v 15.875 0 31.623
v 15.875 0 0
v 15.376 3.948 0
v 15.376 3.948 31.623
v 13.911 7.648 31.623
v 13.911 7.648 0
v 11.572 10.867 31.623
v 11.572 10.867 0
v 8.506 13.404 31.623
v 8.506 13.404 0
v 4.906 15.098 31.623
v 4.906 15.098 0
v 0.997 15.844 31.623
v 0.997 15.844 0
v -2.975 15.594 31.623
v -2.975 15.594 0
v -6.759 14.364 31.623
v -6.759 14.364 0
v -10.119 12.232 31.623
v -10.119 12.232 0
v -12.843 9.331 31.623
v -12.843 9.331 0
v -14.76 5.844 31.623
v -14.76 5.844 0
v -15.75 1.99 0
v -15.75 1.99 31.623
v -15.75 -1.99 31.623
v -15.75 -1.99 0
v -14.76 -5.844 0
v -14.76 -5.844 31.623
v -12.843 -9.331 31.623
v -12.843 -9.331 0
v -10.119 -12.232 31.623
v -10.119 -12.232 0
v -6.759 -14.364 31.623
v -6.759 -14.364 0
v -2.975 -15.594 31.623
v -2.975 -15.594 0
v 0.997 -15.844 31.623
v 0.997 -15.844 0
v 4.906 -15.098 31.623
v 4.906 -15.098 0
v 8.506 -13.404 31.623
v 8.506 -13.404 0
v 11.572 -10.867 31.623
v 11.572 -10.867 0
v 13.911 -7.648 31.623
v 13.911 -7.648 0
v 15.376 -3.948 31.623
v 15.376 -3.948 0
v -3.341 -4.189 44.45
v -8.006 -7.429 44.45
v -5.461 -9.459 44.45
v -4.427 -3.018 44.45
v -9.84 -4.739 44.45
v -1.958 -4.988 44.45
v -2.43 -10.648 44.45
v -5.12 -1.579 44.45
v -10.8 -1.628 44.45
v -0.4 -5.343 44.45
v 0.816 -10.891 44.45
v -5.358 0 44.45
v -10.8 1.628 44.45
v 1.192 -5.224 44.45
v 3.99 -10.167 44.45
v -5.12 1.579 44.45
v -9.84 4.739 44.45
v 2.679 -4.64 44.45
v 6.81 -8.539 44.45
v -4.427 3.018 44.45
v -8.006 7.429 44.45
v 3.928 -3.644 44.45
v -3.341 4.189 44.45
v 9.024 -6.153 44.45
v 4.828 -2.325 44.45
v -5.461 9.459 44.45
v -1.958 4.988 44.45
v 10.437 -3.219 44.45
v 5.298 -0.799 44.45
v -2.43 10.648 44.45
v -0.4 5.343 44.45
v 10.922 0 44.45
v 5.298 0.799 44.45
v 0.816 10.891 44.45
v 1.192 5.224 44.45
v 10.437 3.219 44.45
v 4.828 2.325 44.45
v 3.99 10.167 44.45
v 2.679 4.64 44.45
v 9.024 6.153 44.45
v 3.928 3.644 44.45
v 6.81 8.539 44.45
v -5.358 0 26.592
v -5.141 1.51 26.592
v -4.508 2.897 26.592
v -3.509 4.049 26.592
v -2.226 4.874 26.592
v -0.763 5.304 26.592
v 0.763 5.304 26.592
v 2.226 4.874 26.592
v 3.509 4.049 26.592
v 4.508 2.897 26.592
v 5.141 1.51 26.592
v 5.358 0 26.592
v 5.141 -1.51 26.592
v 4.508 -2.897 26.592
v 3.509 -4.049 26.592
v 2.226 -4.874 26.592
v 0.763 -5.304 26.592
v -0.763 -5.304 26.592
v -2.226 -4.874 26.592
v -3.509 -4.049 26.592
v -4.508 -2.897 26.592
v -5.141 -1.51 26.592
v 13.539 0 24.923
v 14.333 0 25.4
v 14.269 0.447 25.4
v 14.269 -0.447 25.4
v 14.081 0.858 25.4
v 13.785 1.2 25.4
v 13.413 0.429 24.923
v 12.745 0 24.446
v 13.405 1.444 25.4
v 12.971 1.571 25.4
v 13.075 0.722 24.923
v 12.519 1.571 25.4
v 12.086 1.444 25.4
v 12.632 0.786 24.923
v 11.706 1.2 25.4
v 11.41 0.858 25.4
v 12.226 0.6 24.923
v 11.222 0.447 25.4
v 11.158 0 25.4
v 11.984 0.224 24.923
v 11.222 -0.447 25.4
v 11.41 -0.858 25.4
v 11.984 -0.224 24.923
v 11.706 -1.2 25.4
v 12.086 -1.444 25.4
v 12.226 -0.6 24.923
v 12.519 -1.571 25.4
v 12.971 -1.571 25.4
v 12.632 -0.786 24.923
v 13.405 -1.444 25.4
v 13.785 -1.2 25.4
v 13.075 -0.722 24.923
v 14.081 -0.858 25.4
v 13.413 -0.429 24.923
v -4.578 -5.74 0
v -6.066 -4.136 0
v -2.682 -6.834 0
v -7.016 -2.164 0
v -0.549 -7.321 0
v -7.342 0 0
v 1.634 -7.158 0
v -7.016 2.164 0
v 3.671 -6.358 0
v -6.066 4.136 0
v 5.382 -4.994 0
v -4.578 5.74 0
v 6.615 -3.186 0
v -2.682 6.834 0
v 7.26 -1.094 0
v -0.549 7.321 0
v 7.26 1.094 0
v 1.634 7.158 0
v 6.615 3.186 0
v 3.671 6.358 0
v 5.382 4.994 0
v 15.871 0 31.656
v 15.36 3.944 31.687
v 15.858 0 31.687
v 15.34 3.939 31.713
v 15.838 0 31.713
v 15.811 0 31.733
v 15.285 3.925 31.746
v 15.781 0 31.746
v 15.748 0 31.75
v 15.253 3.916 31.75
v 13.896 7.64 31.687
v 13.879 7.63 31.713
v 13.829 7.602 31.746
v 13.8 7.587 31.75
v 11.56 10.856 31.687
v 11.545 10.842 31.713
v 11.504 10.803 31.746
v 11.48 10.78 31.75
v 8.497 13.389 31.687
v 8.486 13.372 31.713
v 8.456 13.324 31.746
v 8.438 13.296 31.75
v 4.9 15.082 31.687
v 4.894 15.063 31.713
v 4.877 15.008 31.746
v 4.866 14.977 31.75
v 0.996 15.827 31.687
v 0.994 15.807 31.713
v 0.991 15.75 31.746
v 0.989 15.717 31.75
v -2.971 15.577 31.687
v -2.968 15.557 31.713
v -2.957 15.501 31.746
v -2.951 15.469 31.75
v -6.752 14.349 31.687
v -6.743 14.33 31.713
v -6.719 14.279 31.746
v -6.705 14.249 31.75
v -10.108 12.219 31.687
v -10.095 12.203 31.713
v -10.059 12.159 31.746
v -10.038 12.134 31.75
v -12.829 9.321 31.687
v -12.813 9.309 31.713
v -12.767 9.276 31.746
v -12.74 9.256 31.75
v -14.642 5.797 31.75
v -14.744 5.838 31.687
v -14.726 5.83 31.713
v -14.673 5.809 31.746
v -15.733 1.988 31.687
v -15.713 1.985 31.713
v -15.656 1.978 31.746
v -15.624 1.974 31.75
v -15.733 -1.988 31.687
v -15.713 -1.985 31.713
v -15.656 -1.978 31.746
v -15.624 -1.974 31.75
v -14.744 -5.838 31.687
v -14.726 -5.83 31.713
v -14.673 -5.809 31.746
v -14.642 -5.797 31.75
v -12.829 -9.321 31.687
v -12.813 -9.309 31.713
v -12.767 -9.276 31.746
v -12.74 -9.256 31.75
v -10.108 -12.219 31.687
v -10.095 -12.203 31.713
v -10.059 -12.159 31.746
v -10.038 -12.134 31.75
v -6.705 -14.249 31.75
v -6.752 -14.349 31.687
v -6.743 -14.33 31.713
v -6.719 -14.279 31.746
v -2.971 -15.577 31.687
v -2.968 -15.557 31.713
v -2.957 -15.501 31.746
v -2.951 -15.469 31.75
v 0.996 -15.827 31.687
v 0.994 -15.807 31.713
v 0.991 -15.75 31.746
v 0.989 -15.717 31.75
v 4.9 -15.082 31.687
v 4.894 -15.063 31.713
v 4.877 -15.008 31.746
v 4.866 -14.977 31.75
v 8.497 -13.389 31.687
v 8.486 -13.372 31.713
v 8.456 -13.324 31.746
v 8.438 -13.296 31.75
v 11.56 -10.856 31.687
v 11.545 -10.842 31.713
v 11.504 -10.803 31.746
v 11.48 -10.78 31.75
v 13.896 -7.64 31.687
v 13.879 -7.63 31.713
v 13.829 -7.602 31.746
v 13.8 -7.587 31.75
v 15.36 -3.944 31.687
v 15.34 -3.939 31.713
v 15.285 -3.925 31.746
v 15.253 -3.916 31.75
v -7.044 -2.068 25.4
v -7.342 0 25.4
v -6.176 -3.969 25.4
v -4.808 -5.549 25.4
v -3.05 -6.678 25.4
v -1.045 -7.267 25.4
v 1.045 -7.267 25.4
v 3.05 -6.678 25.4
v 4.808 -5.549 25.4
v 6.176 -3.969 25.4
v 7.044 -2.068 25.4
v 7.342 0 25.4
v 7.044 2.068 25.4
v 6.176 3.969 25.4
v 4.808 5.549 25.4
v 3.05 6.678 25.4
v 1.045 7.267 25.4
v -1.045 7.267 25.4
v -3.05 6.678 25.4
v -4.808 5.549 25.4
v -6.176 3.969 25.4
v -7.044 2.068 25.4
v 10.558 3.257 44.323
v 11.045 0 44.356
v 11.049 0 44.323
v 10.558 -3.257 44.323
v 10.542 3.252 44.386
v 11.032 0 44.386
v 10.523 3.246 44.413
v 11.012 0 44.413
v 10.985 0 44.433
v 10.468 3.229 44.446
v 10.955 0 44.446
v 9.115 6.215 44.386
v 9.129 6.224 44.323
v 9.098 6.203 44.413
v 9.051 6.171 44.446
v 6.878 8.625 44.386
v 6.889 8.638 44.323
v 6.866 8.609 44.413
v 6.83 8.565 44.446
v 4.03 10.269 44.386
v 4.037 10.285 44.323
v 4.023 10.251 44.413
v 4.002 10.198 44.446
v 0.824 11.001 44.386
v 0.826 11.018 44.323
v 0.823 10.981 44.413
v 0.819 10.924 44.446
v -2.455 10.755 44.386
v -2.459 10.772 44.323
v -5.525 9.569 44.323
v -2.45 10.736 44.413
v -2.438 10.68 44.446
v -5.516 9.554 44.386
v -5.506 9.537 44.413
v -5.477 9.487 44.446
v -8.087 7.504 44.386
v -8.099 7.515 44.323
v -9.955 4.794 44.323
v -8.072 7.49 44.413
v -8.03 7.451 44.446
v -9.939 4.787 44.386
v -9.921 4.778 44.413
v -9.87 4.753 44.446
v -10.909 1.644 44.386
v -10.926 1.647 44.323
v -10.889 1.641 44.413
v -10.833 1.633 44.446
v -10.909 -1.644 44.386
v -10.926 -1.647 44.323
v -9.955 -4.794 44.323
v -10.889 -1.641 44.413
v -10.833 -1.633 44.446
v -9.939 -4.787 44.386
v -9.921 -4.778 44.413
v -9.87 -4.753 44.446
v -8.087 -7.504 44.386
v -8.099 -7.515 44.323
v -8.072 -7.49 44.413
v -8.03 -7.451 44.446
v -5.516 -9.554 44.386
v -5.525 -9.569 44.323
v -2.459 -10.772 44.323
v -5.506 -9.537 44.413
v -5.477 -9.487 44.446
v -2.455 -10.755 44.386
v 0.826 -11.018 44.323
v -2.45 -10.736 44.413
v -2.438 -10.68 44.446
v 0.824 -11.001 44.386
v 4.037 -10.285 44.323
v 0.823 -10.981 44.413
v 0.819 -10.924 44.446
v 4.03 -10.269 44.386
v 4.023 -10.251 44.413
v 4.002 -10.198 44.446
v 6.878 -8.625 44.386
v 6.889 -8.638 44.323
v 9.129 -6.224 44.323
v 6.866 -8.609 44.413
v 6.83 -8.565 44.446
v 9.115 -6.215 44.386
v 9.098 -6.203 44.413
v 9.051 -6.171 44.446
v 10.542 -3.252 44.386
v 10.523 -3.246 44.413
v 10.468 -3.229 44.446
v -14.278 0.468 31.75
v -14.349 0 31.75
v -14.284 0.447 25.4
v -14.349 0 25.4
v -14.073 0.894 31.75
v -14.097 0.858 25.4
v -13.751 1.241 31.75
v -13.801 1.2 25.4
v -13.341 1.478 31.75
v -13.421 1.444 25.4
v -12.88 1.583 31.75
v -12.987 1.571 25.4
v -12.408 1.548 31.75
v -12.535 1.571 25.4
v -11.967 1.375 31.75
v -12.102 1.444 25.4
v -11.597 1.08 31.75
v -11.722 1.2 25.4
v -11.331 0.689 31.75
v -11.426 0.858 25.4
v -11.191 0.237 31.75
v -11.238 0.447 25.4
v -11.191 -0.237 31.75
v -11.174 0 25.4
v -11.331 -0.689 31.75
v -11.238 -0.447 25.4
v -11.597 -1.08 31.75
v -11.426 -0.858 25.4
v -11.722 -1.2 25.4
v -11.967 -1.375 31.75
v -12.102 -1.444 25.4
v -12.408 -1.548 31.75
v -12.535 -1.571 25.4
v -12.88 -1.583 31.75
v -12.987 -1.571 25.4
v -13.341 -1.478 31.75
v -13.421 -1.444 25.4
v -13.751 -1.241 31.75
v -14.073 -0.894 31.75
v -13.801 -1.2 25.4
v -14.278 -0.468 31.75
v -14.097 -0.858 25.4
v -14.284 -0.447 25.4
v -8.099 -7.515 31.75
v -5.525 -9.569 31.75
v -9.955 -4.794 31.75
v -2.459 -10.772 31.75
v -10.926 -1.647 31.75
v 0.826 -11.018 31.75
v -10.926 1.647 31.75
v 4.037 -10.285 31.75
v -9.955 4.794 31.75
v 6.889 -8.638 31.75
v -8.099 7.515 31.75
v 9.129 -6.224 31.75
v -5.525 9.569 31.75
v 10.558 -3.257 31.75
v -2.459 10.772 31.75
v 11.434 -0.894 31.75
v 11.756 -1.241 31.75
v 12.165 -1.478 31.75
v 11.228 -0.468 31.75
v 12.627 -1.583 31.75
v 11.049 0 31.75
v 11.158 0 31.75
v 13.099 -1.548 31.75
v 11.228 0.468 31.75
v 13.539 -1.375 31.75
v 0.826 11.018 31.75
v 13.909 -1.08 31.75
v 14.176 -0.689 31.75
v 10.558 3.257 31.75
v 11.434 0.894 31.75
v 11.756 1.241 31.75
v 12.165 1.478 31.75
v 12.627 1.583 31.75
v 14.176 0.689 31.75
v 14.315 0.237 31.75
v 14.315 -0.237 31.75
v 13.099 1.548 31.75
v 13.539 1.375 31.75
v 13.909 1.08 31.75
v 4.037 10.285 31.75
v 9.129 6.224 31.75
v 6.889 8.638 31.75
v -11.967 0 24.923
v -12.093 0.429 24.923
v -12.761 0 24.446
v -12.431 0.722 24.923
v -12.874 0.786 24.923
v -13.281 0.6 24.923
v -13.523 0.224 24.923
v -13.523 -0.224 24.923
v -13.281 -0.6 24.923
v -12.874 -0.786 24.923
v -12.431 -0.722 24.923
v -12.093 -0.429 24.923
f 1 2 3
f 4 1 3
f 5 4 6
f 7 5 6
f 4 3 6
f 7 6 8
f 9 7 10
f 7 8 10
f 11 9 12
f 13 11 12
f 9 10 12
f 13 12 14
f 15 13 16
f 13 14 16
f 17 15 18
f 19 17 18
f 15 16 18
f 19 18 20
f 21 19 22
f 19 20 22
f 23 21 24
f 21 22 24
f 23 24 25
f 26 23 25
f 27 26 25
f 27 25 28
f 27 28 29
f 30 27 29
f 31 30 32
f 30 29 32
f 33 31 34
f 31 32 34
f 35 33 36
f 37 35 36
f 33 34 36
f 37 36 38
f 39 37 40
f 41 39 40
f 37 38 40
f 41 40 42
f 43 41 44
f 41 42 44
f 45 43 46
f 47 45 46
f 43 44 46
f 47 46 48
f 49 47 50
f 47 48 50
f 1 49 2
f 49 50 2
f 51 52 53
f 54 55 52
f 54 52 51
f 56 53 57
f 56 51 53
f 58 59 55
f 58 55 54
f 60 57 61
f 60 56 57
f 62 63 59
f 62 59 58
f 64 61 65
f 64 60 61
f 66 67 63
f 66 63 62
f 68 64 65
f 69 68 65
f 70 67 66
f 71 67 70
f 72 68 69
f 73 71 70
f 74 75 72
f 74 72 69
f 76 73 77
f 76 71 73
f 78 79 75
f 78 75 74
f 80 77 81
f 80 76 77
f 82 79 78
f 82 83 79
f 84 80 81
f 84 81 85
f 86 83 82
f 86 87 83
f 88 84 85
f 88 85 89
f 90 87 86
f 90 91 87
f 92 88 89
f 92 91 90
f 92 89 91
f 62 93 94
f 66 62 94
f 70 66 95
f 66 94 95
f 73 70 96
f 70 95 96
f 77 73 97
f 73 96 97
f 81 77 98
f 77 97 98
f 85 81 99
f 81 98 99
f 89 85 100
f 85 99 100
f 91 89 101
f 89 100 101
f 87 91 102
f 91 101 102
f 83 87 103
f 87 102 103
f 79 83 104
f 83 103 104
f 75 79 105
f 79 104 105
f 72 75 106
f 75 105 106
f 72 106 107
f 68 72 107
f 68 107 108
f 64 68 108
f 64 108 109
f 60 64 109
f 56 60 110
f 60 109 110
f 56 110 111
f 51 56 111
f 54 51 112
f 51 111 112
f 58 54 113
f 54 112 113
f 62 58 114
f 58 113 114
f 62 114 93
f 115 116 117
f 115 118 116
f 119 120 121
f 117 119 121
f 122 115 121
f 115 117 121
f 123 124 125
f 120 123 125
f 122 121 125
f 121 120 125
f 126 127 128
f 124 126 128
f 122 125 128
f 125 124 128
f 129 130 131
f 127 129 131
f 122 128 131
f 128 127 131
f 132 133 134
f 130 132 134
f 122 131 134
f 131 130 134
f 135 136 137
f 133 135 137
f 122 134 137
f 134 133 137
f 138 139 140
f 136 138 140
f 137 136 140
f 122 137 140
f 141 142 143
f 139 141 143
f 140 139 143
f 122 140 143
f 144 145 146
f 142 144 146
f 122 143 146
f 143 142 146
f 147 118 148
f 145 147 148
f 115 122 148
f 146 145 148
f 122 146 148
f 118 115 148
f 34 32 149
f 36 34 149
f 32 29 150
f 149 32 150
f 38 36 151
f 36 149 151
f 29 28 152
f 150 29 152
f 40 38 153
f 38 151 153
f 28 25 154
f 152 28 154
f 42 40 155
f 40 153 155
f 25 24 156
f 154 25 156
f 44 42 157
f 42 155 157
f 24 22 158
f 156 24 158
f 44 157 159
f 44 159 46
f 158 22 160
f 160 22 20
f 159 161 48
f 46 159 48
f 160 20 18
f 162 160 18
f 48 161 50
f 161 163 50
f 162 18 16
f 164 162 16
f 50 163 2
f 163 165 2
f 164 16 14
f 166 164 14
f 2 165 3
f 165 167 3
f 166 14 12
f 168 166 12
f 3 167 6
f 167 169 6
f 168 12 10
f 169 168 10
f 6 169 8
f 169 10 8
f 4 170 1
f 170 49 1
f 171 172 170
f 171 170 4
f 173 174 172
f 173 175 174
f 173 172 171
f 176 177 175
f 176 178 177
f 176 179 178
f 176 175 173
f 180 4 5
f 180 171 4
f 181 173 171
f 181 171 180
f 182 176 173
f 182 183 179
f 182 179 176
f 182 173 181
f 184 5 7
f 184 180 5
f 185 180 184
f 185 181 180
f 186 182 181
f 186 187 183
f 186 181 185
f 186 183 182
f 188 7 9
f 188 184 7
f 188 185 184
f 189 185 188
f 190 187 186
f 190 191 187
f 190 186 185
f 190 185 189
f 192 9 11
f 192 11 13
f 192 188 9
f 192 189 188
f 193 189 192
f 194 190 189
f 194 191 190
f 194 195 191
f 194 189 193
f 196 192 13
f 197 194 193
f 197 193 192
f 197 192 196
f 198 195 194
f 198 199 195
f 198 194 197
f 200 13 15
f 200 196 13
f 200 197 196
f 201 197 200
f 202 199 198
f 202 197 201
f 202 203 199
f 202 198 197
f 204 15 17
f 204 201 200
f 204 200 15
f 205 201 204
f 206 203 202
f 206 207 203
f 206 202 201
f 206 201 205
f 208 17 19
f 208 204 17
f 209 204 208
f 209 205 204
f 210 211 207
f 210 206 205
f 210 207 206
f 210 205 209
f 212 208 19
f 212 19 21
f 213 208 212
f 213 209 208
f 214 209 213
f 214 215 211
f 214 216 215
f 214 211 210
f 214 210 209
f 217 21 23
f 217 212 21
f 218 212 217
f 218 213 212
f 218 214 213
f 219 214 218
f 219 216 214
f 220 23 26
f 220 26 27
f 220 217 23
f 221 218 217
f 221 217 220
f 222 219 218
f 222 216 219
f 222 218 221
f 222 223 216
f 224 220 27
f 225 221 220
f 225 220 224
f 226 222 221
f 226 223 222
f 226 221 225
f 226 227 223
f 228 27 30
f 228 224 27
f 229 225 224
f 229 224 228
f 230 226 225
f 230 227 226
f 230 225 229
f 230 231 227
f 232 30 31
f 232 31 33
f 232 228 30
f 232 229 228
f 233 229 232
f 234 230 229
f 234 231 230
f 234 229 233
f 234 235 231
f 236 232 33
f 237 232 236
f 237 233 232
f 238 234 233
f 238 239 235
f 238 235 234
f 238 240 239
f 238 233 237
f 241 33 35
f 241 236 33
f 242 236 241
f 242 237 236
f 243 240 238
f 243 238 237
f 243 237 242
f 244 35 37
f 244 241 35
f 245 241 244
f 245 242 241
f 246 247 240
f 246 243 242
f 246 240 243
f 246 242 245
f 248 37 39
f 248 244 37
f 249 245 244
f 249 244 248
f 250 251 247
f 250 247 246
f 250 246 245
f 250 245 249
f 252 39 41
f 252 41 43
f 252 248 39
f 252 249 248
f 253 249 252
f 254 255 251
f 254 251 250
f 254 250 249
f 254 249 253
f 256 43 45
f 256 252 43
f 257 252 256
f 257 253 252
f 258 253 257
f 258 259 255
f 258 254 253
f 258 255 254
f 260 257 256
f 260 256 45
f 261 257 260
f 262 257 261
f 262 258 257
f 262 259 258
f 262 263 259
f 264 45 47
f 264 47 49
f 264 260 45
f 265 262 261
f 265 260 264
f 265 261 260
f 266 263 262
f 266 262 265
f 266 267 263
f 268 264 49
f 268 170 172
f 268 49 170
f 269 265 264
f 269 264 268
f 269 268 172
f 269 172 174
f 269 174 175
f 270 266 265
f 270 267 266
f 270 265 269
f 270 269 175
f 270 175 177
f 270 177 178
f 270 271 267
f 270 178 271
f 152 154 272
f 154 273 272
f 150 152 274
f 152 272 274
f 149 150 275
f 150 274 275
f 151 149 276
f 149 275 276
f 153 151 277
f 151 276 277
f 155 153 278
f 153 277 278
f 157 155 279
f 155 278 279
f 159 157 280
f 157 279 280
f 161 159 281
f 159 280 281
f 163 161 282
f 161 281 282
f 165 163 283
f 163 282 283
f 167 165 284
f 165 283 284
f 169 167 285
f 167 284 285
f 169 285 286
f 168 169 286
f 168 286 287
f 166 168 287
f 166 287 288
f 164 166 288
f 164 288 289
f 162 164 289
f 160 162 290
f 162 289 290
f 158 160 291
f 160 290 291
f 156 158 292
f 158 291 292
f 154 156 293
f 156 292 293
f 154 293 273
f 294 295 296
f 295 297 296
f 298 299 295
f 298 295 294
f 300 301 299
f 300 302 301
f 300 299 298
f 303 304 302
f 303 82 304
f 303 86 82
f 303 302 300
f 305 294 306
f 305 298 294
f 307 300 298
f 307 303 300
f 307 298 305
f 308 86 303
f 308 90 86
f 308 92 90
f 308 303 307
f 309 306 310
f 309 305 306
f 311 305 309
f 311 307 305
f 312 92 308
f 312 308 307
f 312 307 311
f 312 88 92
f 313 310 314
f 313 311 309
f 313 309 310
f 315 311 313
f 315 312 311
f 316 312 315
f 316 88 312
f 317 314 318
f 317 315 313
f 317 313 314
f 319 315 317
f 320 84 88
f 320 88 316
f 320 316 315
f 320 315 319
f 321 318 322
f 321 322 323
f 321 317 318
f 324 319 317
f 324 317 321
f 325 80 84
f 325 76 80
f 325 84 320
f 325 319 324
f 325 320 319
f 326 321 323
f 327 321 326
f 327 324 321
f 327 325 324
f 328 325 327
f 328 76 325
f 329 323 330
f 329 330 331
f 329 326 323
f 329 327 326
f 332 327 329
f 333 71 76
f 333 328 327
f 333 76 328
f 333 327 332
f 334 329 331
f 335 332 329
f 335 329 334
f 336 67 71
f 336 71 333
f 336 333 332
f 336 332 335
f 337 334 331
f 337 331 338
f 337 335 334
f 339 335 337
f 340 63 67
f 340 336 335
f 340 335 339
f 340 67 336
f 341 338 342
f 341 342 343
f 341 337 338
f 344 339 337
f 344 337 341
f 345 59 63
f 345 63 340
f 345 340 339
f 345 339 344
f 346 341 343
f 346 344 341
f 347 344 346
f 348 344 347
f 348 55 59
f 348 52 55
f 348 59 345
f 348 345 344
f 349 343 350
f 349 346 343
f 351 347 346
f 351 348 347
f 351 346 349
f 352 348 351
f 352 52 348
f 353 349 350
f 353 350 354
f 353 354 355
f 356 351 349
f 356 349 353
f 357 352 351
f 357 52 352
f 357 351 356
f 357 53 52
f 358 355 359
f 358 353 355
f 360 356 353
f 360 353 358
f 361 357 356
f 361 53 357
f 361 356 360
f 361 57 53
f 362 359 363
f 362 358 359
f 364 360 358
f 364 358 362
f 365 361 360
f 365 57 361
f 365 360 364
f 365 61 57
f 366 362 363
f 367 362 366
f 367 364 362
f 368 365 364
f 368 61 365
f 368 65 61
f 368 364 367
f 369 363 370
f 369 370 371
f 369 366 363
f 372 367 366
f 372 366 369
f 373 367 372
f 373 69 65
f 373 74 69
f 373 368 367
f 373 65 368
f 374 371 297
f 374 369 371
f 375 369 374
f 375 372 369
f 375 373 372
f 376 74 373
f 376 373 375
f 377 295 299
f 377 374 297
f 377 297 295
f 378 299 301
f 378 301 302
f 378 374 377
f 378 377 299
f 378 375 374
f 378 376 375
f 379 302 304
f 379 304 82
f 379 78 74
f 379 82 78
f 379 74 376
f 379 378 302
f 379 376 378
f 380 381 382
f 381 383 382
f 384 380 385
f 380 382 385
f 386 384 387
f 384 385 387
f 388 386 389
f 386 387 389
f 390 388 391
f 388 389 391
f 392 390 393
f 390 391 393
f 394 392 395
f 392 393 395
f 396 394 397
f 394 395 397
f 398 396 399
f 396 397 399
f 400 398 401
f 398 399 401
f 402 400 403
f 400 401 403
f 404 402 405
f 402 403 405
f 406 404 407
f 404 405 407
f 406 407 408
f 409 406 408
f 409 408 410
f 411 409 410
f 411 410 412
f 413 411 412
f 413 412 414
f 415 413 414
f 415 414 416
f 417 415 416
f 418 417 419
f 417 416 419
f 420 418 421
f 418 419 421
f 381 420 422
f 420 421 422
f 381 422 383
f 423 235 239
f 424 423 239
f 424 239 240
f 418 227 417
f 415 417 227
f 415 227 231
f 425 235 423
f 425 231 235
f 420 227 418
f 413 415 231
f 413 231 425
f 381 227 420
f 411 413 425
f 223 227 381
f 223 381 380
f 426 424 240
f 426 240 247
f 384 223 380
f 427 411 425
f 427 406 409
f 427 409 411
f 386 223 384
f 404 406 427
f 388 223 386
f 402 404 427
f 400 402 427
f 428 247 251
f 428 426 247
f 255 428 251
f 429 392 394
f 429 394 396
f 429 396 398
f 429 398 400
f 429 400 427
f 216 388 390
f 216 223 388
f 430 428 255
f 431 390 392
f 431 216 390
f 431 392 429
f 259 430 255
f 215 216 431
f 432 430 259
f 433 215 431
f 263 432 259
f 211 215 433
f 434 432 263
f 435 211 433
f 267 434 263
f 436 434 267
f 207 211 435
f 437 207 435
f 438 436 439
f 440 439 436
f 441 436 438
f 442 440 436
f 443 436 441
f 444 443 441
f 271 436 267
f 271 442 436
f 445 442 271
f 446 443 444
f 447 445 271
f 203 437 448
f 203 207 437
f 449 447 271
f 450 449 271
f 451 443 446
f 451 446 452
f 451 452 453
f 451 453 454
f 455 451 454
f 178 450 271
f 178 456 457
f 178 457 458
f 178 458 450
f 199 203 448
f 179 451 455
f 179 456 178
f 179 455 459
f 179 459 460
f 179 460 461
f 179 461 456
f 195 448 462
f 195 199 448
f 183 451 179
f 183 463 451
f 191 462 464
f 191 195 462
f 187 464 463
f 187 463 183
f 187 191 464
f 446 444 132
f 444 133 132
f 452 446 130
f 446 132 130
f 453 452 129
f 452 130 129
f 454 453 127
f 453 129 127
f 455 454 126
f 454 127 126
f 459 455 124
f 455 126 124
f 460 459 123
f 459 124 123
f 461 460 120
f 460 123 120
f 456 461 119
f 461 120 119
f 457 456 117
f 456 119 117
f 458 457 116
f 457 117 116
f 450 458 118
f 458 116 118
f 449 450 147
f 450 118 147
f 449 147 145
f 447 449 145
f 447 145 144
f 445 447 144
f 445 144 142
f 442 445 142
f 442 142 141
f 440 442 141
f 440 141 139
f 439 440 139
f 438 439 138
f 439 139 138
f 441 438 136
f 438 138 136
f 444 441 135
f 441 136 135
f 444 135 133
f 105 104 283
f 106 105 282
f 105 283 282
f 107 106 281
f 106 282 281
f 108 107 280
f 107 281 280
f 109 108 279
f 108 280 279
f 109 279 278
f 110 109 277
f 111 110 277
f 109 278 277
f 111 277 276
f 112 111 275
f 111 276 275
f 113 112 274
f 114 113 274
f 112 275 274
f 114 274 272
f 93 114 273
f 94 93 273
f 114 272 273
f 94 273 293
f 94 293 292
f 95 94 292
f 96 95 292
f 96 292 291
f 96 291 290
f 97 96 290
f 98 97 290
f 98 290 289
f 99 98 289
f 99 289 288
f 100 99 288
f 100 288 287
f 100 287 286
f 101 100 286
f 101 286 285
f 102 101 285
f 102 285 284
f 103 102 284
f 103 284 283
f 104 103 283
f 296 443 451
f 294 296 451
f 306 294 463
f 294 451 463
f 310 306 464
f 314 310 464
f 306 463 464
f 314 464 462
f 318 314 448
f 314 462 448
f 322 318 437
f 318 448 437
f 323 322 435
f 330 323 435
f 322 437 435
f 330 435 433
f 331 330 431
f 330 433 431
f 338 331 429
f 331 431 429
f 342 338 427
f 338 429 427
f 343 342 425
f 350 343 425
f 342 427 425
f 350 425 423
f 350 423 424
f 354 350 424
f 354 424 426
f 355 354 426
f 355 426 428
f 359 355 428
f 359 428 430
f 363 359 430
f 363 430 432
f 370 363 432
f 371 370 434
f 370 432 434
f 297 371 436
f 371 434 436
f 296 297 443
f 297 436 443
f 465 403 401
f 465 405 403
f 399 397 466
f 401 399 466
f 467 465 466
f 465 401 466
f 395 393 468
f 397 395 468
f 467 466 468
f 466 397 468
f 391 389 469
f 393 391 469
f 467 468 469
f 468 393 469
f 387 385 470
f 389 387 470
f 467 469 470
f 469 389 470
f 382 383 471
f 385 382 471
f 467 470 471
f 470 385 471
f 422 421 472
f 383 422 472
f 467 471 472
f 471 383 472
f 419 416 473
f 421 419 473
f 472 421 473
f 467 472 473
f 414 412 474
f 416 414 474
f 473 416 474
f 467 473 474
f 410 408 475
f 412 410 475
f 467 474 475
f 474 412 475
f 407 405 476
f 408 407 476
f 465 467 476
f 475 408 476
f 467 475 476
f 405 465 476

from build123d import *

# Parameters (mm, degrees)
F0_R      = 15.875
F1_DEPTH  = 31.75
F2_R      = 11.049
F3_DEPTH  = 12.7
F5_D      = 10.71626
F5_DEPTH  = 18.5615384615
F5_TIP    = 3.2194893086
F7_D      = 3.175
F7_DEPTH  = 6.35
F7_TIP    = 0.9538662327
F8_R      = 0.127
F10_D     = 14.68374
F10_DEPTH = 25.4
F10_TIP   = 4.411440553


with BuildPart() as f1:
    # F0 (on Top) → F1 (new body)
    with BuildSketch(Plane.XY):
        Circle(F0_R)
    extrude(amount=F1_DEPTH)

    # F2 (on face) → F3 (join)
    with BuildSketch(Plane.XY.offset(31.75)):
        Circle(F2_R)
    extrude(amount=F3_DEPTH)

    # F5
    with Locations(Plane.XY.offset(44.45)):
        with Locations((0, 0)):
            Hole(F5_D / 2, depth=F5_DEPTH)
            with Locations((0, 0, -(F5_DEPTH + F5_TIP / 2))):  # 118° drill point
                Cone(0, F5_D / 2, F5_TIP, mode=Mode.SUBTRACT)

    # F7
    with Locations(Plane.XY.offset(31.75)):
        with Locations((-12.7611987248, 0), (12.7453794703, 0)):
            Hole(F7_D / 2, depth=F7_DEPTH)
            with Locations((0, 0, -(F7_DEPTH + F7_TIP / 2))):  # 118° drill point
                Cone(0, F7_D / 2, F7_TIP, mode=Mode.SUBTRACT)

    # F8
    f8_edges = [f1.edges().sort_by_distance(p)[0] for p in [
        (-11.049, 0, 44.45),
        (-15.875, 0, 31.75),
    ]]
    fillet(f8_edges, radius=F8_R)

    # F10
    with Locations(Plane(origin=(0, 0, 0), x_dir=(1, 0, 0), z_dir=(0, 0, -1))):
        with Locations((0, 0)):
            Hole(F10_D / 2, depth=F10_DEPTH)
            with Locations((0, 0, -(F10_DEPTH + F10_TIP / 2))):  # 118° drill point
                Cone(0, F10_D / 2, F10_TIP, mode=Mode.SUBTRACT)


solid = f1.part
